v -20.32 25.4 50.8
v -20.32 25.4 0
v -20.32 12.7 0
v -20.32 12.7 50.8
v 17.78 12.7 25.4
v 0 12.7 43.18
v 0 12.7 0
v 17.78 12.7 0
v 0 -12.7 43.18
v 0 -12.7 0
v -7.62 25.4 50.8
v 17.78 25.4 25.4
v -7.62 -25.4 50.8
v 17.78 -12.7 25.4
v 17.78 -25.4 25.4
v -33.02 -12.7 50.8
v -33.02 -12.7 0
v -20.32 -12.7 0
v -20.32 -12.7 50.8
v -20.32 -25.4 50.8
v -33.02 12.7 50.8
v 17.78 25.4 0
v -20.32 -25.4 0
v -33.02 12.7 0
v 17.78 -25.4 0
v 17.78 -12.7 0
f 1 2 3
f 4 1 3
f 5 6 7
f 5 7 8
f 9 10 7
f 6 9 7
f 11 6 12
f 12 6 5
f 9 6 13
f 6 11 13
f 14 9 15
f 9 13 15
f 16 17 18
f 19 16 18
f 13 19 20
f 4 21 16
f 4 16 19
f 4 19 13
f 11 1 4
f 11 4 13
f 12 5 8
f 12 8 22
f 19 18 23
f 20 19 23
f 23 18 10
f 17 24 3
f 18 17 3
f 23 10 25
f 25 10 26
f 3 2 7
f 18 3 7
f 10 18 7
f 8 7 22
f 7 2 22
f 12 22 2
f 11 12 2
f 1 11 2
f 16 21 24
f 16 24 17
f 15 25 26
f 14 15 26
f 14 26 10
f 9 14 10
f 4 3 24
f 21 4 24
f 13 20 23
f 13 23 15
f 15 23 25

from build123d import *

# Parameters (mm, degrees)
F1_DEPTH = 50.8
F3_DEPTH = 50.801


with BuildPart() as f1:
    # F0 (on Top) → F1 (new body)
    with BuildSketch(Plane.XY):
        Polygon((-20.32, -25.4), (17.78, -25.4), (17.78, -12.7), (0, -12.7), (0, 12.7), (17.78, 12.7), (17.78, 25.4), (-20.32, 25.4), (-20.32, 12.7), (-33.02, 12.7), (-33.02, 0), (-33.02, -12.7), (-20.32, -12.7), align=None)
    extrude(amount=F1_DEPTH)

    # F2 (on face) → F3 (cut, through all)
    with BuildSketch(Plane.XZ.offset(25.4)):
        Polygon((17.78, 50.8), (-7.62, 50.8), (17.78, 25.4), align=None)
    extrude(amount=-F3_DEPTH, mode=Mode.SUBTRACT)


solid = f1.part
